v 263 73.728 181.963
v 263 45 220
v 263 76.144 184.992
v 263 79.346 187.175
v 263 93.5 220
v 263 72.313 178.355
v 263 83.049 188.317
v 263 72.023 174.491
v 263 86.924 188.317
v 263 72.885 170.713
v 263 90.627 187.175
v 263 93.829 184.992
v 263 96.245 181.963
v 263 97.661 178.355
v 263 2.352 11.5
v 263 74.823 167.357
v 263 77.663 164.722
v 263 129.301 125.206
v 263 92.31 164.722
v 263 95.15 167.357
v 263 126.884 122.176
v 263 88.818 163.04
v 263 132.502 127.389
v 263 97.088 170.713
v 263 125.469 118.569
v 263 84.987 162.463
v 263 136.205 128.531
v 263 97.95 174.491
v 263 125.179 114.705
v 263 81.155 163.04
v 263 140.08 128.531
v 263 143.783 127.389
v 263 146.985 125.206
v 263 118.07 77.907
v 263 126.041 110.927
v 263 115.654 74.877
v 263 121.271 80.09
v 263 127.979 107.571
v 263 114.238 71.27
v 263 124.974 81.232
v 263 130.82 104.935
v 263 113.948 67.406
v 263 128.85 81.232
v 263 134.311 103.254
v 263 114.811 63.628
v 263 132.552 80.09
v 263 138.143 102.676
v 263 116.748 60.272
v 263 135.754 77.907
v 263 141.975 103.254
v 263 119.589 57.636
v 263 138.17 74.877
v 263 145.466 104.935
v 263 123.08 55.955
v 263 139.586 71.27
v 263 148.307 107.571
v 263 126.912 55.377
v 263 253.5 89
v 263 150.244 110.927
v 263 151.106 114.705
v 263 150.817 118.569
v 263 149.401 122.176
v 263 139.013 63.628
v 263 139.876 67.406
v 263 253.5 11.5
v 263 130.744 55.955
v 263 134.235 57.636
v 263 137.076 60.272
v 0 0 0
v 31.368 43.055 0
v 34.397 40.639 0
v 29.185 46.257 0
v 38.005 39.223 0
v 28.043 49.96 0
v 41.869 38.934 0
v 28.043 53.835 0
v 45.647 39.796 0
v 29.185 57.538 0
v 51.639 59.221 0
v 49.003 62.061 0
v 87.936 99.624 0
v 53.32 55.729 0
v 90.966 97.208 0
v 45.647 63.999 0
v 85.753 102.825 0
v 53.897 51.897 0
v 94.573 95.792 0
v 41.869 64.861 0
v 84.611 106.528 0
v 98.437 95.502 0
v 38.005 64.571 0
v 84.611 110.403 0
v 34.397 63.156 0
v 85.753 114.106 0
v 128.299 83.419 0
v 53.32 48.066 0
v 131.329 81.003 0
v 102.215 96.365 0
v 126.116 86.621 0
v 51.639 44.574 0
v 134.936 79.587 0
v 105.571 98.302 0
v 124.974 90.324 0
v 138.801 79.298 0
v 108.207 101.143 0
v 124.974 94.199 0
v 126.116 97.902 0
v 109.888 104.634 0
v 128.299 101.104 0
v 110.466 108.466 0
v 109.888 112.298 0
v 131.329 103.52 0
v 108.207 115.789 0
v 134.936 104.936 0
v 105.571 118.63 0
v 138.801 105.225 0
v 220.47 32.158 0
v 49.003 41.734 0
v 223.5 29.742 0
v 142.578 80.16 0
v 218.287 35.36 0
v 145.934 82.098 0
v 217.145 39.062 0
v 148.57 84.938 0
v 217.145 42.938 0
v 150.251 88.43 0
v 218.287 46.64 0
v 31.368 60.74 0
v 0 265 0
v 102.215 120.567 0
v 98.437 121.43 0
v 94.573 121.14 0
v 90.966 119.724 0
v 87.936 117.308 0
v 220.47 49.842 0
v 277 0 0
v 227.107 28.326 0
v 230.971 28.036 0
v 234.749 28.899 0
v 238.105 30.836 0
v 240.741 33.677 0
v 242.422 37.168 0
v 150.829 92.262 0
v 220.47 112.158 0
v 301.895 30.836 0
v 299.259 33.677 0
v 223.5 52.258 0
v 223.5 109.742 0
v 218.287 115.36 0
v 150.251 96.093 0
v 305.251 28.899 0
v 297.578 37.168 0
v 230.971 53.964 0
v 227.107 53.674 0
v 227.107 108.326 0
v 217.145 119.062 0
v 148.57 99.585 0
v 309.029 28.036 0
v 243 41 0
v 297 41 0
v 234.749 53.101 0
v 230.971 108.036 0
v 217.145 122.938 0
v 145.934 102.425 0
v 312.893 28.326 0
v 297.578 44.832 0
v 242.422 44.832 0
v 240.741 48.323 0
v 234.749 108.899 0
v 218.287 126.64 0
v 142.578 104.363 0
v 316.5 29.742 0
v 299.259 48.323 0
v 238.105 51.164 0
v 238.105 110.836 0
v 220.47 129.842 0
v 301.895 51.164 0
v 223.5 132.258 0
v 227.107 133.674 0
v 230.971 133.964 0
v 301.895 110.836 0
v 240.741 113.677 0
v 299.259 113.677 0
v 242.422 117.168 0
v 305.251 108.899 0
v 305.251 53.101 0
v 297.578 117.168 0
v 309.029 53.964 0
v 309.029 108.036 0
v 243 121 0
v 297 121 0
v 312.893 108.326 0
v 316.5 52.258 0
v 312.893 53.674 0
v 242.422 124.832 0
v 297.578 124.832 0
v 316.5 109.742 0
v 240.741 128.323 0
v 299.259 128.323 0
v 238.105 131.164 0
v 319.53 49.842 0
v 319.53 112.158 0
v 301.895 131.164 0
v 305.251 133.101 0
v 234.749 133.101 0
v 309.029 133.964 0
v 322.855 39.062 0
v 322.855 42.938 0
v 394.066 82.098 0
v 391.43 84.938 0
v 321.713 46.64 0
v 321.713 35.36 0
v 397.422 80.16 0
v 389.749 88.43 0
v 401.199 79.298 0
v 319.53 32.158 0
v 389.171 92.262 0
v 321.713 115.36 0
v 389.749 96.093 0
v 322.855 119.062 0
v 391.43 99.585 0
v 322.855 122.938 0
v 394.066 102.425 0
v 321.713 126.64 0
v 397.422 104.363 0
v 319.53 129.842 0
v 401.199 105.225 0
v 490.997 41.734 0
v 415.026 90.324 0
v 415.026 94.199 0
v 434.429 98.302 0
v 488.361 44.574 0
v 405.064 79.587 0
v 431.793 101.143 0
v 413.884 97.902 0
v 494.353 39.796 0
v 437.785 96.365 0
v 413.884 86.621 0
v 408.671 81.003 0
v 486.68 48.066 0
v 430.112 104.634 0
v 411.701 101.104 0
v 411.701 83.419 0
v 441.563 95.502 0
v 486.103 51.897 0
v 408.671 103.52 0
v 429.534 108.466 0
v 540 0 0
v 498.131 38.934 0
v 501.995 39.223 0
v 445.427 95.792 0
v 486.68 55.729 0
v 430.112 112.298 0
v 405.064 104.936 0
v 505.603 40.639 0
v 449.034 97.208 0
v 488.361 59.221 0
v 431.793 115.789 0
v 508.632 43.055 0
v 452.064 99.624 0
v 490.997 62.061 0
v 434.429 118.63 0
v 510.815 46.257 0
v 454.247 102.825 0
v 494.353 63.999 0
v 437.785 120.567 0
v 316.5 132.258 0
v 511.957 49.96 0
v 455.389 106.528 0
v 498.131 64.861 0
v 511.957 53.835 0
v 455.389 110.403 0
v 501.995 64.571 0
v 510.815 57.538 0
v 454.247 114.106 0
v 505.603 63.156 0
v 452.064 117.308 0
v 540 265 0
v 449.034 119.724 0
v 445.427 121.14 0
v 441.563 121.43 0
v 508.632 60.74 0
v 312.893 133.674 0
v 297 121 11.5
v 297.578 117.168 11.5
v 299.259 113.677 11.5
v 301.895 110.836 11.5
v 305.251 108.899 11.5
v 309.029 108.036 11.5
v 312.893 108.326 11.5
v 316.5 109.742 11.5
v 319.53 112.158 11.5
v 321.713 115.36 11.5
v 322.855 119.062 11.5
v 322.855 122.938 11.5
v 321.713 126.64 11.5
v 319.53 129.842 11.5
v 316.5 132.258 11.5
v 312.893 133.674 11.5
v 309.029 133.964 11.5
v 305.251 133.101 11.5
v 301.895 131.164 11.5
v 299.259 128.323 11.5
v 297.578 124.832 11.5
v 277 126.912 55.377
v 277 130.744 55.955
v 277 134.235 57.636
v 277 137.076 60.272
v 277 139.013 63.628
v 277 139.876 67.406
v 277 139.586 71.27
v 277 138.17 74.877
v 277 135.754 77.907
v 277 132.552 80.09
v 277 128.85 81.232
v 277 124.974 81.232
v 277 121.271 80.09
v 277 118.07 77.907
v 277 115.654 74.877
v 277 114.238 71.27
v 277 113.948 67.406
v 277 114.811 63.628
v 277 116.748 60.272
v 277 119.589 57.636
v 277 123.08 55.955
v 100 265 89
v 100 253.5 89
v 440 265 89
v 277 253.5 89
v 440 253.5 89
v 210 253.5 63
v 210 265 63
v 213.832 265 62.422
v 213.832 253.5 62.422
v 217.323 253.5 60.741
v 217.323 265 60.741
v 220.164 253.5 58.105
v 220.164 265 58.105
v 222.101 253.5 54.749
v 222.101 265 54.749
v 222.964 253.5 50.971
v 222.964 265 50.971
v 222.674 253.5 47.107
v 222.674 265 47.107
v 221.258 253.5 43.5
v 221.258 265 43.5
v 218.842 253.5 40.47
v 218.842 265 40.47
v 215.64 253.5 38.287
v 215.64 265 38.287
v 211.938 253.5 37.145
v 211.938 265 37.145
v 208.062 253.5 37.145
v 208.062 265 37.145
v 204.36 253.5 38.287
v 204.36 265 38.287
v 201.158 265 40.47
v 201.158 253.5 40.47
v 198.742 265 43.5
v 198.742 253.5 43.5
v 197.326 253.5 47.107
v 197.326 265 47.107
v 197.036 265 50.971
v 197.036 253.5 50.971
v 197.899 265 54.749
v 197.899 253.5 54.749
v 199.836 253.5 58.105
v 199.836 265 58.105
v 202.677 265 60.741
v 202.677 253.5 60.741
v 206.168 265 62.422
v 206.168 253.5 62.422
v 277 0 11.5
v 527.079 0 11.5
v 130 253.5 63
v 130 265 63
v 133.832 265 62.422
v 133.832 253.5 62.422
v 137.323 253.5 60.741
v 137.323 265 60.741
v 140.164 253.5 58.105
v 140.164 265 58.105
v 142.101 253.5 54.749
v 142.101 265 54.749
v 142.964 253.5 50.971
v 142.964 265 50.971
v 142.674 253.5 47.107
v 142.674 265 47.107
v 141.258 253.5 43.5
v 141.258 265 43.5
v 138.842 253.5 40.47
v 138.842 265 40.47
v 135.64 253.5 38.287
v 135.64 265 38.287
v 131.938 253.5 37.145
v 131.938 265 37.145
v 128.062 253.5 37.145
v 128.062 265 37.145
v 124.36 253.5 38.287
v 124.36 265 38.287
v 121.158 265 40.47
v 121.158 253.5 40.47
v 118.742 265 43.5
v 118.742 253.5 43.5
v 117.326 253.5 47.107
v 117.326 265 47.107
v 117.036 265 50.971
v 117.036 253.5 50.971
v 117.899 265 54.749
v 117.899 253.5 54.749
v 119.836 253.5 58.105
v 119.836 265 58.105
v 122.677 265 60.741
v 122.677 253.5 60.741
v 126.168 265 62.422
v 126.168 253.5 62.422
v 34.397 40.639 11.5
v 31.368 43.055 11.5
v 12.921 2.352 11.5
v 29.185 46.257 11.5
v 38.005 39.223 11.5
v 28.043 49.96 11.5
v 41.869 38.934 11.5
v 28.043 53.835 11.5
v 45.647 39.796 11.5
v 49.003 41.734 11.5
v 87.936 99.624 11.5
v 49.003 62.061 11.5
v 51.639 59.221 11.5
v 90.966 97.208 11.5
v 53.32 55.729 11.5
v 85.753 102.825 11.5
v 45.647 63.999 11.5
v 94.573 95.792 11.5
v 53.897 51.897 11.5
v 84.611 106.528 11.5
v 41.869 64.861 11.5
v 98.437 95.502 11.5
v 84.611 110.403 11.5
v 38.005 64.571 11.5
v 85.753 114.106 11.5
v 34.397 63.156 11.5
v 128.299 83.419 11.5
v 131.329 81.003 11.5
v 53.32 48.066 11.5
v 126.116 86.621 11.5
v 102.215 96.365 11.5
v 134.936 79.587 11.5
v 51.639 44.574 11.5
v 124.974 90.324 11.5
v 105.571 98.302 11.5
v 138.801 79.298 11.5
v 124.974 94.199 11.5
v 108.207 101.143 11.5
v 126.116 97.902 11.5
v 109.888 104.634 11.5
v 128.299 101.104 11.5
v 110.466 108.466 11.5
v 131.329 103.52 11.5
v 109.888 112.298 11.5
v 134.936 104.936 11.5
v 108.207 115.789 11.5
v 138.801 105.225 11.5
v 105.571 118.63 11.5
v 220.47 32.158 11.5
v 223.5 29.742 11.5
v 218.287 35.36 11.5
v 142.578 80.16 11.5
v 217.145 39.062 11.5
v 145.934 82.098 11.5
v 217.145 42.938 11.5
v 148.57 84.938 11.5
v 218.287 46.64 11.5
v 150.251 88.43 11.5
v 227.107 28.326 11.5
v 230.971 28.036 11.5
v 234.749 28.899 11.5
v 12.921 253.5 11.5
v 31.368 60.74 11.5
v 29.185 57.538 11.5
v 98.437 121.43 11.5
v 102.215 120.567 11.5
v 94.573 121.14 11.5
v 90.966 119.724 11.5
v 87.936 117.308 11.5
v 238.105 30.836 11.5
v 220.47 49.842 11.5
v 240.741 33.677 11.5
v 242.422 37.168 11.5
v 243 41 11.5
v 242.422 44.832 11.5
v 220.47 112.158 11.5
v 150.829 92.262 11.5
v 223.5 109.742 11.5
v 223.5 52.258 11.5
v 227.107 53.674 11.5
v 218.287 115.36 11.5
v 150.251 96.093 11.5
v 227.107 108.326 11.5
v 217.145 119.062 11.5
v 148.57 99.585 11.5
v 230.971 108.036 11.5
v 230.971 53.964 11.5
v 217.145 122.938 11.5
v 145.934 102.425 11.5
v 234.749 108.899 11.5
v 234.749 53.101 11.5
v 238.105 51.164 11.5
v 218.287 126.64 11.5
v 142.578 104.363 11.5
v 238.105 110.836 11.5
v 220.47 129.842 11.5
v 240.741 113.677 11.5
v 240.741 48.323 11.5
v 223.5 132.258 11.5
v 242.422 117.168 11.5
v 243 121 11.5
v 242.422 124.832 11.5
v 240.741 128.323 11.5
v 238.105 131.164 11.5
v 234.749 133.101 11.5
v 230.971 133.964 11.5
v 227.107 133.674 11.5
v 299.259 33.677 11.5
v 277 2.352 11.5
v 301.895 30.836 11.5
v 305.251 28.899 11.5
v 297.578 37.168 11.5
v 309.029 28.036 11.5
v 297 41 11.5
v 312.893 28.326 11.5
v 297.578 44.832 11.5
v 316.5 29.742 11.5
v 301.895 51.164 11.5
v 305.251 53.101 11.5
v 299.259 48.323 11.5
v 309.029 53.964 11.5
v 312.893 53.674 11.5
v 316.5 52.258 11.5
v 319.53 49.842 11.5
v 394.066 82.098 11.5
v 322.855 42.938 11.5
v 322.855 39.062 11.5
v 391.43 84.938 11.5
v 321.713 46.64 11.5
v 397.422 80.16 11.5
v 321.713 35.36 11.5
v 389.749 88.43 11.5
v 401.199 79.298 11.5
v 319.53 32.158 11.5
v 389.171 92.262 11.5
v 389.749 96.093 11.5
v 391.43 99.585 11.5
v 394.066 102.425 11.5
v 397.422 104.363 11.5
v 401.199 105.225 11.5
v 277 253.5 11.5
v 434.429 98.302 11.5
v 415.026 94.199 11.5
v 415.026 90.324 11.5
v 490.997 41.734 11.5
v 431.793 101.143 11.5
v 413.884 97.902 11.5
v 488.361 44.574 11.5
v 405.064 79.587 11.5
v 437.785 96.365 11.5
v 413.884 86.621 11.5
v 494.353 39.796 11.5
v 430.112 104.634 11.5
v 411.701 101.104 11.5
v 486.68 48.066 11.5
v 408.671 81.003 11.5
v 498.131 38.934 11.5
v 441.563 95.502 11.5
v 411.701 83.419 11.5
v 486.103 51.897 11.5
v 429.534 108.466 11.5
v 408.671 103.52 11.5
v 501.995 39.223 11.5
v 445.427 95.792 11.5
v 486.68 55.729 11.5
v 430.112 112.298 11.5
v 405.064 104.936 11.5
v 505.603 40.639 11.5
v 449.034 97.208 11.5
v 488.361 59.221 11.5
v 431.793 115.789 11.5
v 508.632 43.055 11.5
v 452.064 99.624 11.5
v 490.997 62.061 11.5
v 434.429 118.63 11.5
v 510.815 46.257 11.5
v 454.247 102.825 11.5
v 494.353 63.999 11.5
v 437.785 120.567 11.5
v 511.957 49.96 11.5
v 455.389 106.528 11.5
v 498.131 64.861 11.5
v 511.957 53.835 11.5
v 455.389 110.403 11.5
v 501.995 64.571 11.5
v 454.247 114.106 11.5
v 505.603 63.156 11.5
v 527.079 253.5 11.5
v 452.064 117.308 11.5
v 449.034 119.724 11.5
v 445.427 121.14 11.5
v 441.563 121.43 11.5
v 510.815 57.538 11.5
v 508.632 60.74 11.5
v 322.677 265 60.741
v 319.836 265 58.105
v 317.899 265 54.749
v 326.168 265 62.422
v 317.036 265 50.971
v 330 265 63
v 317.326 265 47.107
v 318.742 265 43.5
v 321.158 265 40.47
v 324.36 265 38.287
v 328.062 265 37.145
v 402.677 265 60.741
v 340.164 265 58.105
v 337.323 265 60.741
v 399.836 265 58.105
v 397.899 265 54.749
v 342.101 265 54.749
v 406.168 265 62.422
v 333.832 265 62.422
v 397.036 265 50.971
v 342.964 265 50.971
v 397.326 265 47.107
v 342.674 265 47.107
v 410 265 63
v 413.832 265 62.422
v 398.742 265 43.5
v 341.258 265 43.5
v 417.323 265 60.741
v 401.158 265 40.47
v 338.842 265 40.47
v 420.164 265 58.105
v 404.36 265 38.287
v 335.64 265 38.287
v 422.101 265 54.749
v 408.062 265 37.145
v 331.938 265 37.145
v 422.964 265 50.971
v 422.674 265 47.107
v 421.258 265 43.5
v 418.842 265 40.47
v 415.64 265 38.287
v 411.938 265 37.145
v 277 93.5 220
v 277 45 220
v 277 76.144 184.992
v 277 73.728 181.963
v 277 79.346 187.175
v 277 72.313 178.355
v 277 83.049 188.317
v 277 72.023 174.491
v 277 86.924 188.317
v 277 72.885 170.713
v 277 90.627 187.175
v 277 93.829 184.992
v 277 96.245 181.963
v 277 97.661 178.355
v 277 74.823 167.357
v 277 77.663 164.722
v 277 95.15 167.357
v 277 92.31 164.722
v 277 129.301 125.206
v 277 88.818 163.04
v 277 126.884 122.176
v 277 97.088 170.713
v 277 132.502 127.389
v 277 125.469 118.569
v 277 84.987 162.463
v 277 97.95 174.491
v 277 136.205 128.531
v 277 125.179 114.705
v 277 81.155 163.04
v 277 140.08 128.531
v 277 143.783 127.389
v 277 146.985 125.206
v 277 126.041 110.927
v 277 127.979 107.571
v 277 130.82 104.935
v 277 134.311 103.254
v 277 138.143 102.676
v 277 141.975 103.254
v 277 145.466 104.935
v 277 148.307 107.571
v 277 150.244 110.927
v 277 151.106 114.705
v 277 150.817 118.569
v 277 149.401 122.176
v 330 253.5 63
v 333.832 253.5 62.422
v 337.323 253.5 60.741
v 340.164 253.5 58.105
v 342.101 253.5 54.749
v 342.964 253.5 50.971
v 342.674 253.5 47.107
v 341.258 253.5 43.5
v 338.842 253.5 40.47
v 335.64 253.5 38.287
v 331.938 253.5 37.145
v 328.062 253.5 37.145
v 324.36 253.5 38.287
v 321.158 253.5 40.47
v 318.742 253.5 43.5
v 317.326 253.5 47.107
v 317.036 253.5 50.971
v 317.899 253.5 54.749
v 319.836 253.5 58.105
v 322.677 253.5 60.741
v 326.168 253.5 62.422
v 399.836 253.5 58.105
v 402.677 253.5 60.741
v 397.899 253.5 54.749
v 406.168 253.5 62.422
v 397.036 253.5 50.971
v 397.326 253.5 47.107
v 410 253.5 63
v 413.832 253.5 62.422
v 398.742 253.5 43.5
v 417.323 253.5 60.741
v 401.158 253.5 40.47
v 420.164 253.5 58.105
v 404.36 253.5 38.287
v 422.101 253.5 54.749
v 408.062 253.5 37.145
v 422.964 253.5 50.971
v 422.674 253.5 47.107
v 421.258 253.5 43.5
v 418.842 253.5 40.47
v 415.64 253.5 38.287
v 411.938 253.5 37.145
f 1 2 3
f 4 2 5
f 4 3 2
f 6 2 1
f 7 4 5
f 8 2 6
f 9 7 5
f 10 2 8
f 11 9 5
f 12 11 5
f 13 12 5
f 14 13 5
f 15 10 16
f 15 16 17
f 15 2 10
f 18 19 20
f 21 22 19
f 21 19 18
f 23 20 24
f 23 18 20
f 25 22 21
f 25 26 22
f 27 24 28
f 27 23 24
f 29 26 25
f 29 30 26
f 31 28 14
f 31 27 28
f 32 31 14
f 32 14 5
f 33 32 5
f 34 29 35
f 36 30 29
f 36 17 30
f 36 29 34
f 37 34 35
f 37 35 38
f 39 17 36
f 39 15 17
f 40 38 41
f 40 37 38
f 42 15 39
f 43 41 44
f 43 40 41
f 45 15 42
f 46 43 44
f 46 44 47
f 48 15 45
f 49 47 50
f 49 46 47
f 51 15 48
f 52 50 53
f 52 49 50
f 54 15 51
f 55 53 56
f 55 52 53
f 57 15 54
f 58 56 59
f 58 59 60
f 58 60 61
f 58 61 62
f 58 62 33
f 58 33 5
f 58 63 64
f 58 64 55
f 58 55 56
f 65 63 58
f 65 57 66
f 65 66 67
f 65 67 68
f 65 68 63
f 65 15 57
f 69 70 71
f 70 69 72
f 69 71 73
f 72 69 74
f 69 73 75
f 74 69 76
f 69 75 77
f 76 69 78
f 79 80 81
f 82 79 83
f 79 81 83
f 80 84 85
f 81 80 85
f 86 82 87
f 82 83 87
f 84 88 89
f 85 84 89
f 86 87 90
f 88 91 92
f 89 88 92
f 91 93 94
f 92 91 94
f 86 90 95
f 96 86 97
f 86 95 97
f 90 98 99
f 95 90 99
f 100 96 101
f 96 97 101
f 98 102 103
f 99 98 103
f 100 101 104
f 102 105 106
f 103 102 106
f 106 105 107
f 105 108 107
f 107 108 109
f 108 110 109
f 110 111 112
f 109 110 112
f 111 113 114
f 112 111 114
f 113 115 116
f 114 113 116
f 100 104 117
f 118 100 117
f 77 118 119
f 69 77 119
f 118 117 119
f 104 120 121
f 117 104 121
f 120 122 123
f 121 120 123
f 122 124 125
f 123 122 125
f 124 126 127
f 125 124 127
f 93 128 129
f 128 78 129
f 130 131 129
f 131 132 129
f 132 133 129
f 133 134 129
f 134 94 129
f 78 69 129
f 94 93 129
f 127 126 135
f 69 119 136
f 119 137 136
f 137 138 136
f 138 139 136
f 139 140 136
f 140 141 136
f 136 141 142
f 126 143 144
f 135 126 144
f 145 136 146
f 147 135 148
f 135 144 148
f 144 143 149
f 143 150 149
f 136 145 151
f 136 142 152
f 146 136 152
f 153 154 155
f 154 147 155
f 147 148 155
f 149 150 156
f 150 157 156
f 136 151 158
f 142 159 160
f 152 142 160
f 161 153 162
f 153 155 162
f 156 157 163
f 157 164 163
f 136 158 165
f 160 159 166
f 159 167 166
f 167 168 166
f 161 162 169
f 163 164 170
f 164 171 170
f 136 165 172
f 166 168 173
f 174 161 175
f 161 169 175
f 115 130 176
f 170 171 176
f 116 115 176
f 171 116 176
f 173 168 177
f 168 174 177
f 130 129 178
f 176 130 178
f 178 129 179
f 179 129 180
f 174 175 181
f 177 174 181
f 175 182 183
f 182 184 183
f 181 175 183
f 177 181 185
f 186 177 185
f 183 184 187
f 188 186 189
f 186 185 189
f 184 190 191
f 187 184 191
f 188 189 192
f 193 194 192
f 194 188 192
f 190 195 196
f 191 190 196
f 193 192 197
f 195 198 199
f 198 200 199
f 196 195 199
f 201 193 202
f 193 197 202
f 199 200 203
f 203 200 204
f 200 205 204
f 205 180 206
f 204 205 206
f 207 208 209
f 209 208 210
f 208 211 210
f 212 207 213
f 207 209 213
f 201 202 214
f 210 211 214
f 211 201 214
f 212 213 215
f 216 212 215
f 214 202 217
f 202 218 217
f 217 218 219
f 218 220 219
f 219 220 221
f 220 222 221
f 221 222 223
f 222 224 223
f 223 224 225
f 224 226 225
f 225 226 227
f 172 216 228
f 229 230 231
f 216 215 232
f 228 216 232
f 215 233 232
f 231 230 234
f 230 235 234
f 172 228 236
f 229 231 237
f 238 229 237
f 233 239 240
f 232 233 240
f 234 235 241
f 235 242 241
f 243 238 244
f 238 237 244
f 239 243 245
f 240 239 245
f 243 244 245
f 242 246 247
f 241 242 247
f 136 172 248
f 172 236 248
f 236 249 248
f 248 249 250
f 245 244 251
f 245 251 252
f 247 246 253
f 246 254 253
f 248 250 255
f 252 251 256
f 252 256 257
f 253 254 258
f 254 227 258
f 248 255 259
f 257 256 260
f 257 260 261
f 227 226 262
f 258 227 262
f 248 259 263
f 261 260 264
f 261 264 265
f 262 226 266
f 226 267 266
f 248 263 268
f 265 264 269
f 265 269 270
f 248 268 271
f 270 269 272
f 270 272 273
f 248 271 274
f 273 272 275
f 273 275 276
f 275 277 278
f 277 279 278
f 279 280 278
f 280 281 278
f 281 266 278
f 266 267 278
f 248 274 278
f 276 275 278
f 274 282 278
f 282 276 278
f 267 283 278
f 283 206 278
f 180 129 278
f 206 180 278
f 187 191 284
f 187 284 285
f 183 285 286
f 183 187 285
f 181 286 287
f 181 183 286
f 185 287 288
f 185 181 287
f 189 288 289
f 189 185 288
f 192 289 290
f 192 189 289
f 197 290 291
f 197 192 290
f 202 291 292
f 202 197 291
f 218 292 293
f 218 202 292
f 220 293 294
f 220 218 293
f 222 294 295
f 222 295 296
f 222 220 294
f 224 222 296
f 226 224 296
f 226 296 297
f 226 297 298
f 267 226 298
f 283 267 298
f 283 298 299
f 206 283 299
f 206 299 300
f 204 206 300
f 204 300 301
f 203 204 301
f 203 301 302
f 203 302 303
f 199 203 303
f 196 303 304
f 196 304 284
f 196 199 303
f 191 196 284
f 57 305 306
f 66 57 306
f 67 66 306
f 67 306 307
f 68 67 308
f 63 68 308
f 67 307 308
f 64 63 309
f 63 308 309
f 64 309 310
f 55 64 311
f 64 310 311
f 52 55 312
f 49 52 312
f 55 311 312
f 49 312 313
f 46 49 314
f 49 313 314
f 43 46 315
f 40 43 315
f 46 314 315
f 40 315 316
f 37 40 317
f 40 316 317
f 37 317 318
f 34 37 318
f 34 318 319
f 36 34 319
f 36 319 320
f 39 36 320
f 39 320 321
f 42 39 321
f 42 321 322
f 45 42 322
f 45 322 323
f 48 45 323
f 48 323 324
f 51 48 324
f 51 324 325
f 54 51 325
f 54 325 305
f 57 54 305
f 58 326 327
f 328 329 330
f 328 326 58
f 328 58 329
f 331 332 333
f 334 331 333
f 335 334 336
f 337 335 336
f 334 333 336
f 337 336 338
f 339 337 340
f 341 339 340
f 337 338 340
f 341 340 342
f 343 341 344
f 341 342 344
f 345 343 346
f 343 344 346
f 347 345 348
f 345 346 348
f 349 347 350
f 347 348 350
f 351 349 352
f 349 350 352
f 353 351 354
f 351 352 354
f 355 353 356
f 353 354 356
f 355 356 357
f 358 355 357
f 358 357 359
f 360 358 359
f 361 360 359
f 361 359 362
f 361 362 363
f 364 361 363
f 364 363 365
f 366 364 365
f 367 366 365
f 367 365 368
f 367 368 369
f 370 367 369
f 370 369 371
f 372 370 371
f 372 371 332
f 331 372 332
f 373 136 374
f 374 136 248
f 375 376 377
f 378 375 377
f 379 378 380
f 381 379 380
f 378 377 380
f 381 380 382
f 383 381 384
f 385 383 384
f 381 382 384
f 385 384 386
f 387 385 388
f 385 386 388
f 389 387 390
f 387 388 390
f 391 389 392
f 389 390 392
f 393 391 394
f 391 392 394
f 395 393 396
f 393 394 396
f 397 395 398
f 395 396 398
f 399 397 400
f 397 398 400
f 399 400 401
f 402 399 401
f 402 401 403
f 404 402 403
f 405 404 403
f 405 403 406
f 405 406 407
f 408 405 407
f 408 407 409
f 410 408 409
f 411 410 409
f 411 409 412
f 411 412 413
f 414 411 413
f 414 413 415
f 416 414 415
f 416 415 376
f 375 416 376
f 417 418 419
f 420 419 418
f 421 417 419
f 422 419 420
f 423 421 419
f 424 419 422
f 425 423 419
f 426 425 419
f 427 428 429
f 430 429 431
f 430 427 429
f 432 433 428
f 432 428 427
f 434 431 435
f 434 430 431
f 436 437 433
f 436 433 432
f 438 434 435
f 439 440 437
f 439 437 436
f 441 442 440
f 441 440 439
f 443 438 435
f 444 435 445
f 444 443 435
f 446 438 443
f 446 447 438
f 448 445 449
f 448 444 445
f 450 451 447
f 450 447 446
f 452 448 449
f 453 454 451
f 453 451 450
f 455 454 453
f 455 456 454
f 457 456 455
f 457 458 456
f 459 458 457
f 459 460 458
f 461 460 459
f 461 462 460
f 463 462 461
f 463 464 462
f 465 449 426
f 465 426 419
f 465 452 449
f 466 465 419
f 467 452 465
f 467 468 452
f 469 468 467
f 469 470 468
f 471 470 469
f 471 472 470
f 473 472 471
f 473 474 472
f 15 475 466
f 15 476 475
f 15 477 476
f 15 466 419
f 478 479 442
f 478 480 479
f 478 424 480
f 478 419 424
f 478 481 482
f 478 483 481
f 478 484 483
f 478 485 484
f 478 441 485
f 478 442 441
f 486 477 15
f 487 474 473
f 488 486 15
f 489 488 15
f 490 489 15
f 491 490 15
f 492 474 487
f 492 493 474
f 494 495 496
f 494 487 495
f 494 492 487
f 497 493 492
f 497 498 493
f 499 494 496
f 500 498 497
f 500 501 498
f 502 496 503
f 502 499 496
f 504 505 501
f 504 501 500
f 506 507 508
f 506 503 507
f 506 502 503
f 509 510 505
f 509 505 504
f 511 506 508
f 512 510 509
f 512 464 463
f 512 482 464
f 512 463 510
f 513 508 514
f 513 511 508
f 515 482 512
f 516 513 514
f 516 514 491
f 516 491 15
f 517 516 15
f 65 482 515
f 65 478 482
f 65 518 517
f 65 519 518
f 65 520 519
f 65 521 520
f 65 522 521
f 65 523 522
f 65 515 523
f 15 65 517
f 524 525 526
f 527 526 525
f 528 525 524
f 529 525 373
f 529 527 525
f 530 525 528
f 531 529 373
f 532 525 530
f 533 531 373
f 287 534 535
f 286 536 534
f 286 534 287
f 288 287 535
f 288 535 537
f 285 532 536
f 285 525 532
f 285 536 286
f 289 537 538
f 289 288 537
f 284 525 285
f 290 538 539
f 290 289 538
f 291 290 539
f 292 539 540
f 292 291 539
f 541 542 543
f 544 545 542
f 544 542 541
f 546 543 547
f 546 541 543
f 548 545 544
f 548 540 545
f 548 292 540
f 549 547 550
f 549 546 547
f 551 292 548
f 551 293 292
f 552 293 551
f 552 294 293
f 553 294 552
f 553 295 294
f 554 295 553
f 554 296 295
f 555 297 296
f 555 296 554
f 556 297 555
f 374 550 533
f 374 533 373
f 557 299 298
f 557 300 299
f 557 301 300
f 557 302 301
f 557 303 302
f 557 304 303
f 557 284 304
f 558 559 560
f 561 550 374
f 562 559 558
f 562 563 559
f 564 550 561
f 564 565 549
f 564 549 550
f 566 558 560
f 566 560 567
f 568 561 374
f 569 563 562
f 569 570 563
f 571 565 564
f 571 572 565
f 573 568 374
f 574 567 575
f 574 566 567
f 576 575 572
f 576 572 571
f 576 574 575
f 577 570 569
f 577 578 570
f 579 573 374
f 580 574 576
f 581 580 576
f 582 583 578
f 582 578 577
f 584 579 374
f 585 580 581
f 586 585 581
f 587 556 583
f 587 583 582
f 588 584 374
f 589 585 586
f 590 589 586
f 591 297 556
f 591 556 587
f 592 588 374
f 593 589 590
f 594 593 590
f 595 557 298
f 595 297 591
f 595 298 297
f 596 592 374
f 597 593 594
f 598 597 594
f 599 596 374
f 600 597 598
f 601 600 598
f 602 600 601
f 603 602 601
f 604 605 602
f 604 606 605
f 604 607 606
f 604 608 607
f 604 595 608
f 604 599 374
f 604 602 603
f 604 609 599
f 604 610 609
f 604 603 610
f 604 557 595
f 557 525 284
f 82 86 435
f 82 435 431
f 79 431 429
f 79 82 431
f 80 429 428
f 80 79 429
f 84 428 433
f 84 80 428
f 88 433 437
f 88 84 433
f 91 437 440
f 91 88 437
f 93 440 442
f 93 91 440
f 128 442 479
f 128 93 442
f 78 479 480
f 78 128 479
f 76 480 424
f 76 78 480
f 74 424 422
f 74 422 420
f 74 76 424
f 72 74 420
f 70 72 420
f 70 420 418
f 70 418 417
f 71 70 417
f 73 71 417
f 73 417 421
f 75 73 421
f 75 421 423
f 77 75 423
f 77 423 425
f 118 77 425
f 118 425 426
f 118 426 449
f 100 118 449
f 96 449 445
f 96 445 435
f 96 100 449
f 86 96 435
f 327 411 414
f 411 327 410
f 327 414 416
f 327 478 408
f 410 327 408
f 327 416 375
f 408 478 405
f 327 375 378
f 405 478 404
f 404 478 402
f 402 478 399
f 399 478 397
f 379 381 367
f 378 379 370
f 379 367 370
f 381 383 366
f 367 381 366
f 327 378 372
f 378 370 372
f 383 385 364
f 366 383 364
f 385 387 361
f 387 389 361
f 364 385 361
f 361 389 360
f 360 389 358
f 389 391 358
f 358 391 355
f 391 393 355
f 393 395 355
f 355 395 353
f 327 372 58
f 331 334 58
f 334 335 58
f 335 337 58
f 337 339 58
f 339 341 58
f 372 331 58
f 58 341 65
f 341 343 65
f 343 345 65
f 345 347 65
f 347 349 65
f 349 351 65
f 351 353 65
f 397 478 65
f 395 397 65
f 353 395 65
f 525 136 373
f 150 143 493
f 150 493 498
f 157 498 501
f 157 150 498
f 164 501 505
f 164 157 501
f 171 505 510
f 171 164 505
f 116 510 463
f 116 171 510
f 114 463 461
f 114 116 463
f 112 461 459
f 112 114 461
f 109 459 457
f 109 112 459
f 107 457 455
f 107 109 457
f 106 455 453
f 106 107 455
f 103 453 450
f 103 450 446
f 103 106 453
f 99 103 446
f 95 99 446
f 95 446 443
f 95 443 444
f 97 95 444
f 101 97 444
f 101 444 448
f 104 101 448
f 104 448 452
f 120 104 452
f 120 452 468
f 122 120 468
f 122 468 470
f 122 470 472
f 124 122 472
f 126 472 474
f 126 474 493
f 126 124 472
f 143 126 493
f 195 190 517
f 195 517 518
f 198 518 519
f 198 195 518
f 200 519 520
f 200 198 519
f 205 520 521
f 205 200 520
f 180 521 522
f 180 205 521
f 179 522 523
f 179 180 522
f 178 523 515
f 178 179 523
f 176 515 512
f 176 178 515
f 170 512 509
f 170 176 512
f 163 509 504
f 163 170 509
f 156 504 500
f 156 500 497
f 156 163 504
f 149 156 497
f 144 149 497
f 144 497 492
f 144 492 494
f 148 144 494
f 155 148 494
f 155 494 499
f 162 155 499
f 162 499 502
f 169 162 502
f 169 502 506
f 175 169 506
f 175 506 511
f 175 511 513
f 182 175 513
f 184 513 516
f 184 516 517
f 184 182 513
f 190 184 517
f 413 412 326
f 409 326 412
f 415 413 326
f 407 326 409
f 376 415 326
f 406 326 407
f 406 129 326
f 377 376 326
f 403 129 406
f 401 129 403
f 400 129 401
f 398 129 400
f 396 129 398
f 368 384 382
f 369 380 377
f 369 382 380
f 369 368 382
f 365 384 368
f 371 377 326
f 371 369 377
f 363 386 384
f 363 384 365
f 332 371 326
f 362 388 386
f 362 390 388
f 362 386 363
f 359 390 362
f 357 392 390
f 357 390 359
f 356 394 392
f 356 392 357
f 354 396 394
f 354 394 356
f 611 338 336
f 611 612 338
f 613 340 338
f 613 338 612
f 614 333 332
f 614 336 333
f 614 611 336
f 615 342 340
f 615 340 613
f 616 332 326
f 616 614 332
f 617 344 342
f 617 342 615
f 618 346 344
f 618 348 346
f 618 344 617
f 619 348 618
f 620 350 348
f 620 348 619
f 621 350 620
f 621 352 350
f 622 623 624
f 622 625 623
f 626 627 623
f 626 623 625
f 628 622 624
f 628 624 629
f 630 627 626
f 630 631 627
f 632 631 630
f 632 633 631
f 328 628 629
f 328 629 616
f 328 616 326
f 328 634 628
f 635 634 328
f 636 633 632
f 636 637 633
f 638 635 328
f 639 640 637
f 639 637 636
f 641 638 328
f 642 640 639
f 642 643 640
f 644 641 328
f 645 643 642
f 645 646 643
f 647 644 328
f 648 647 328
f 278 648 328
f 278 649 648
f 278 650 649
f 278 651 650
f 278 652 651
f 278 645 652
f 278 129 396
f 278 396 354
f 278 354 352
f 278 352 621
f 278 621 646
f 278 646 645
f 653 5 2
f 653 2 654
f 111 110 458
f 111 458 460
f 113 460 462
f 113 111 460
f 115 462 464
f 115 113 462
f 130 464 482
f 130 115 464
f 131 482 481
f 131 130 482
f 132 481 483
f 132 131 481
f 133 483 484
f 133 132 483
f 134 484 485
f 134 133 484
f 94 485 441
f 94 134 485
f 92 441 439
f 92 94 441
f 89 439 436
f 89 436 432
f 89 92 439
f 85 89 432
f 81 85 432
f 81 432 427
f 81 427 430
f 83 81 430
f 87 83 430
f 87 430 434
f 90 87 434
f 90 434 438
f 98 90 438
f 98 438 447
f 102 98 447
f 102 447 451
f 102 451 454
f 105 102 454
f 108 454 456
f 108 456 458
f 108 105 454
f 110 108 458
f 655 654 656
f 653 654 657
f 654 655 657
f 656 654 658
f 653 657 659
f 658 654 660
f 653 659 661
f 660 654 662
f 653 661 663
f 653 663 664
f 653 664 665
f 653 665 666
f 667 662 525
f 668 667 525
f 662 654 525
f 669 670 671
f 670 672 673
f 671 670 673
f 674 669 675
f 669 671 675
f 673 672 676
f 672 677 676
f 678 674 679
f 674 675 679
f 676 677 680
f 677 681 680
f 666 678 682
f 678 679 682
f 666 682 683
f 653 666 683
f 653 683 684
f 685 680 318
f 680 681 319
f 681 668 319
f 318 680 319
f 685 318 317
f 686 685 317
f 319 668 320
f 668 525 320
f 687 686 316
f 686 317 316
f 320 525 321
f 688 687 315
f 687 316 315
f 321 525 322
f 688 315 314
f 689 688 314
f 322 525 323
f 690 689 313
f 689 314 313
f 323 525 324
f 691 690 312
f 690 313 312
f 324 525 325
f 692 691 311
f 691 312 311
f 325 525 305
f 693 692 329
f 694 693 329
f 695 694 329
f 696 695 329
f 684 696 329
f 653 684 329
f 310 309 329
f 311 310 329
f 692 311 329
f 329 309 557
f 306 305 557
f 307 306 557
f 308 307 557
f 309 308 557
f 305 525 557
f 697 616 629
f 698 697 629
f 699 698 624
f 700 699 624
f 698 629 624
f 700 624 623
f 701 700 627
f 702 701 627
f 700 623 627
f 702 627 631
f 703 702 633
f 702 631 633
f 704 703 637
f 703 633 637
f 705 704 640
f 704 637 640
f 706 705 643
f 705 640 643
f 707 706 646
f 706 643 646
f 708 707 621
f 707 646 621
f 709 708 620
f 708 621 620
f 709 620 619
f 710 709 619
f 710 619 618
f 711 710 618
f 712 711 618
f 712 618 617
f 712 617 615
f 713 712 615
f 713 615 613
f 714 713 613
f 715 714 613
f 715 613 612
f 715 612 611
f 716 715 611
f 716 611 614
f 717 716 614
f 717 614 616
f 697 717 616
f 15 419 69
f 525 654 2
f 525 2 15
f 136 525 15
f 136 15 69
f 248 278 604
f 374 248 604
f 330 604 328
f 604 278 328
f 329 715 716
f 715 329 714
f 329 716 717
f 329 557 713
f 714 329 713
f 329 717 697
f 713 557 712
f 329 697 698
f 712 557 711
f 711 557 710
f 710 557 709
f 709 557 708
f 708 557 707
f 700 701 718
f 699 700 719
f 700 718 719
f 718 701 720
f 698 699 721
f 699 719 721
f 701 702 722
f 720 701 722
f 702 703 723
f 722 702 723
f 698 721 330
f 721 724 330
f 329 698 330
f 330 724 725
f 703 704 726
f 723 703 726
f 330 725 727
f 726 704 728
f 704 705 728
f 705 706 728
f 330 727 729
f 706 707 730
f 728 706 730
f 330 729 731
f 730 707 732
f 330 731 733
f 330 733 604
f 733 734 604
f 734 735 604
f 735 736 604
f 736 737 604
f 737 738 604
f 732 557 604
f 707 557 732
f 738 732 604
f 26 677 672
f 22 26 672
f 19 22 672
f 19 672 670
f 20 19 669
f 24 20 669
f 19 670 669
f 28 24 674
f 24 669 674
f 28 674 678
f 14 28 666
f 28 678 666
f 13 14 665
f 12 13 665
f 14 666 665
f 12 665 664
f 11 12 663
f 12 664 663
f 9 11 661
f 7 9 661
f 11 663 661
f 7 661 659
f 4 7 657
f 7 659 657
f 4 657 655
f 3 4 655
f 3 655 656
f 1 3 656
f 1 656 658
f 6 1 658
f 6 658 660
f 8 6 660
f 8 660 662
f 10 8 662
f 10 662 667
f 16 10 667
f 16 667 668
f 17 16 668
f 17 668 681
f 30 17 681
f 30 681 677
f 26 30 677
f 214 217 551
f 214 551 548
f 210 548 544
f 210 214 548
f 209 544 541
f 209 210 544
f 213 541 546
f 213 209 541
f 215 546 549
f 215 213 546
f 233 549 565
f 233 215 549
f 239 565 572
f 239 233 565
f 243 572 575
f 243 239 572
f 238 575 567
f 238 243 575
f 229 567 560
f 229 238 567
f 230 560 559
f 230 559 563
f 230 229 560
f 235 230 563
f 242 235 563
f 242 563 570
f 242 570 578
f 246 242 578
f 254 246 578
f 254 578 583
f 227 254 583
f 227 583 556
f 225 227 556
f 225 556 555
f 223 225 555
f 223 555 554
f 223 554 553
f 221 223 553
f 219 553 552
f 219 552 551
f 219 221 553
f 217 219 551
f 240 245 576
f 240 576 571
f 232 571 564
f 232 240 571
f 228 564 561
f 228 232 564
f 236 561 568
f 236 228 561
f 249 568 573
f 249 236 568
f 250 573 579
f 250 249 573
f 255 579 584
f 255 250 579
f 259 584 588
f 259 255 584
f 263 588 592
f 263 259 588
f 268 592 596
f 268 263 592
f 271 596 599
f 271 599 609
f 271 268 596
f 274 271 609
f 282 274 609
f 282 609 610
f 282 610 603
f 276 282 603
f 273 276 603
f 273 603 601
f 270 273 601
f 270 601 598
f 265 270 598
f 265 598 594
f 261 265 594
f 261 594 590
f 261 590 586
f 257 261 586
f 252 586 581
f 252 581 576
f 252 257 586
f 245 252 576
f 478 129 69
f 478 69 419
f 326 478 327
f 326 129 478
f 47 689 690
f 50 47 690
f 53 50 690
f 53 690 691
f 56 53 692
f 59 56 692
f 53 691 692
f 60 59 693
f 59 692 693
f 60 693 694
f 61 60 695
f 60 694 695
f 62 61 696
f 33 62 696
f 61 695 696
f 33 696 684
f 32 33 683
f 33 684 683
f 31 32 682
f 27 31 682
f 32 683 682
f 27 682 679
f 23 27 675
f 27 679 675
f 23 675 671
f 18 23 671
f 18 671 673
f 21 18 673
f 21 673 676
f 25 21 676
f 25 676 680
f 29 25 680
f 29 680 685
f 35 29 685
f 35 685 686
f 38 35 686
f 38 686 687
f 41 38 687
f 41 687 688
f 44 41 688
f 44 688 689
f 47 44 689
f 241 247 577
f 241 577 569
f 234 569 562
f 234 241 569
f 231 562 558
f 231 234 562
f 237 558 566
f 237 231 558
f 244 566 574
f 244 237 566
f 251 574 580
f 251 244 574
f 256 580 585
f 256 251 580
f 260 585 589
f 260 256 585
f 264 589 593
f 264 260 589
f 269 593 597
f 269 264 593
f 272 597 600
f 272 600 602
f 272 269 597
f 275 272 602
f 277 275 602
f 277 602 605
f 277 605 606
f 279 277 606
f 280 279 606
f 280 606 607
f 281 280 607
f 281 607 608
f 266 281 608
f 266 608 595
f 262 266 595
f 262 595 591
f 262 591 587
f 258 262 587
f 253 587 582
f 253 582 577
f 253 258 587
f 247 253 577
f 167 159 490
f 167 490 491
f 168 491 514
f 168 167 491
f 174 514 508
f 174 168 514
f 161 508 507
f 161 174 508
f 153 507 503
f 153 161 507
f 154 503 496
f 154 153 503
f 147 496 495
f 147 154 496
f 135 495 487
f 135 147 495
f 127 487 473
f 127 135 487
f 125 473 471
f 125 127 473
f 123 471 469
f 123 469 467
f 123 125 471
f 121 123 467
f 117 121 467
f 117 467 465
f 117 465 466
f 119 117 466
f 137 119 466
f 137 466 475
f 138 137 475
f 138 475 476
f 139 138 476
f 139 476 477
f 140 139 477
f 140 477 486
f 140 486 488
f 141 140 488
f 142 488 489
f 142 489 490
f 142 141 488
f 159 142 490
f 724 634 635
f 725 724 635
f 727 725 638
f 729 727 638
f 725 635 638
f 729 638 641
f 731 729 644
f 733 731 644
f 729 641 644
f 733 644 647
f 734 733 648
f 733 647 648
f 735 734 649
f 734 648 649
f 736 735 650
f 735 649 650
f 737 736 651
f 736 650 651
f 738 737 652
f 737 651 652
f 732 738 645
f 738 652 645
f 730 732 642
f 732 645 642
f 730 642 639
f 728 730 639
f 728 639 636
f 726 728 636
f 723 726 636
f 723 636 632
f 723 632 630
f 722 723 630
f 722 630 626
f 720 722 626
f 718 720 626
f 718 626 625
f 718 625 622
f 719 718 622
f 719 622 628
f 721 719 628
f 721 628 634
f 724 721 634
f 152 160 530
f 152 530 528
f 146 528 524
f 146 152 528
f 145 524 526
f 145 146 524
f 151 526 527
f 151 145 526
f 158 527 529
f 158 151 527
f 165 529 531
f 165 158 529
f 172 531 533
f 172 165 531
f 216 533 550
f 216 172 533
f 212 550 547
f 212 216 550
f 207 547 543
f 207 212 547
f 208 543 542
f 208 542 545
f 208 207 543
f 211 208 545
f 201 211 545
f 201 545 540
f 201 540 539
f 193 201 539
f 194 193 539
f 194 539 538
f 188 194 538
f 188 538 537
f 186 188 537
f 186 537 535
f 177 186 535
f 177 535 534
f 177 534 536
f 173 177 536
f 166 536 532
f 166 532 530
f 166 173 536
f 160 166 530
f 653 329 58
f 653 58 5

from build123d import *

# Parameters (mm, degrees)
SKETCH_1_W          = 540
SKETCH_1_H          = 265
SKETCH_1_R          = 13
EXTRUDE_551_DEPTH   = 11.5
SKETCH_2_W          = 540
SKETCH_2_H          = 11.5
EXTRUDE_1_DEPTH     = 77.5
CUT_EXTRUDE_1_DEPTH = 609.067430471
SKETCH_4_R          = 13
CUT_EXTRUDE_2_DEPTH = 609.067430471
SKETCH_5_W          = 14
SKETCH_5_H          = 253.5
EXTRUDE_2_DEPTH     = 208.5
SKETCH_6_R          = 13
CUT_EXTRUDE_3_DEPTH = 442.988687638


with BuildPart() as part:
    # 草图1 → Extrude 551 (new body)
    with BuildSketch(Plane.XY):
        with Locations((270, 132.5)):
            Rectangle(SKETCH_1_W, SKETCH_1_H)
        with Locations((97.46594539, 108.46594539)):
            Circle(SKETCH_1_R, mode=Mode.SUBTRACT)
        with Locations((40.897402896, 51.897402896)):
            Circle(SKETCH_1_R, mode=Mode.SUBTRACT)
        with Locations(Location((499.102597104, 51.897402896, 0), (0, 0, 180))):
            Circle(SKETCH_1_R, mode=Mode.SUBTRACT)
        with Locations(Location((402.170987639, 92.261534081, 0), (0, 0, 180))):
            Circle(SKETCH_1_R, mode=Mode.SUBTRACT)
        with Locations((230, 121)):
            Circle(SKETCH_1_R, mode=Mode.SUBTRACT)
        with Locations((230, 41)):
            Circle(SKETCH_1_R, mode=Mode.SUBTRACT)
        with Locations(Location((310, 41, 0), (0, 0, 180))):
            Circle(SKETCH_1_R, mode=Mode.SUBTRACT)
        with Locations(Location((310, 121, 0), (0, 0, 180))):
            Circle(SKETCH_1_R, mode=Mode.SUBTRACT)
        with Locations((137.829012361, 92.261534081)):
            Circle(SKETCH_1_R, mode=Mode.SUBTRACT)
        with Locations(Location((442.53405461, 108.46594539, 0), (0, 0, 180))):
            Circle(SKETCH_1_R, mode=Mode.SUBTRACT)
    extrude(amount=EXTRUDE_551_DEPTH)

    # 草图2 → 凸台-拉伸1 (add)
    with BuildSketch(Plane.XY.offset(11.5)):
        with Locations((270, 259.25)):
            Rectangle(SKETCH_2_W, SKETCH_2_H)
    extrude(amount=EXTRUDE_1_DEPTH)

    # 草图3 → 切除-拉伸1 (cut, through all)
    with BuildSketch(Plane(origin=(0, 265, 0), x_dir=(-1, 0, 0), z_dir=(0, 1, 0))):
        Polygon((0, 0), (-100, 89), (0, 89), align=None)
        Polygon((-540, 0), (-440, 89), (-540, 89), align=None)
    extrude(amount=-CUT_EXTRUDE_1_DEPTH, mode=Mode.SUBTRACT)

    # 草图4 → 切除-拉伸2 (cut, through all)
    with BuildSketch(Plane(origin=(0, 265, 0), x_dir=(-1, 0, 0), z_dir=(0, 1, 0))):
        with Locations(Location((-210, 50, 0), (0, 0, 90))):
            Circle(SKETCH_4_R)
        with Locations(Location((-130, 50, 0), (0, 0, 90))):
            Circle(SKETCH_4_R)
        with Locations(Location((-410, 50, 0), (0, 0, 90))):
            Circle(SKETCH_4_R)
        with Locations(Location((-330, 50, 0), (0, 0, 90))):
            Circle(SKETCH_4_R)
    extrude(amount=-CUT_EXTRUDE_2_DEPTH, mode=Mode.SUBTRACT)

    # 草图5 → 凸台-拉伸2 (add)
    with BuildSketch(Plane.XY.offset(11.5)):
        with Locations((270, 126.75)):
            Rectangle(SKETCH_5_W, SKETCH_5_H)
    extrude(amount=EXTRUDE_2_DEPTH)

    # 草图6 → 切除-拉伸3 (cut, through all)
    with BuildSketch(Plane(origin=(277, 0, 0), x_dir=(0, 0, -1), z_dir=(1, 0, 0))):
        with Locations((-115.676148082, 138.142814541)):
            Circle(SKETCH_6_R)
        with Locations((-175.462621788, 84.986652509)):
            Circle(SKETCH_6_R)
        with Locations((-68.377294113, 126.911974174)):
            Circle(SKETCH_6_R)
        Polygon((-89, 253.5), (-220, 93.5), (-220, 253.5), align=None)
        Polygon((-220, 45), (0, 0), (-220, 0), align=None)
    extrude(amount=-CUT_EXTRUDE_3_DEPTH, mode=Mode.SUBTRACT)


solid = part.part
